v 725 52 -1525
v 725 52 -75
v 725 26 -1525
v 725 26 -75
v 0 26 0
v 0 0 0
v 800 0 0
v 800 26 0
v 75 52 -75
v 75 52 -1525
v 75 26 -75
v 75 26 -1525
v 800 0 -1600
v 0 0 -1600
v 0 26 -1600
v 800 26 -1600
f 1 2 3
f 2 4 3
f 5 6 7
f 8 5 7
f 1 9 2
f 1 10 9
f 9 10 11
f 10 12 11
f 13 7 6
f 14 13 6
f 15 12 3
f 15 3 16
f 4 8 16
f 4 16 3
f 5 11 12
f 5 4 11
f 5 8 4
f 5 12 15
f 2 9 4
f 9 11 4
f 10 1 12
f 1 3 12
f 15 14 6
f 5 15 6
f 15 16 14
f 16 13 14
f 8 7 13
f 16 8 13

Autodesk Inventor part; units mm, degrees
ref_plane "YZ Plane" through (0, 0, 0) normal (1, 0, 0) x (0, 1, 0)
ref_plane "XZ Plane" through (0, 0, 0) normal (0, 1, 0) x (-1, 0, 0)
ref_plane "XY Plane" through (0, 0, 0) normal (0, 0, 1) x (1, 0, 0)
sketch "Sketch1" plane through (0, 0, 0) normal (0, 1, 0) x (-1, 0, 0)
  line L0 (0, 0) -> (-800, 0)
  line L1 (-800, 0) -> (-800, -1600)
  line L2 (-800, -1600) -> (0, -1600)
  line L3 (0, -1600) -> (0, 0)
  dimension "d0" = 800
  dimension "d1" = 1600
extrude "Extrusion1" add sketch "Sketch1" along normal blind 26
sketch "Sketch2" plane through (0, 26, 0) normal (0, 1, 0) x (1, 0, 0)
  line L0 (75, 75) -> (725, 75)
  line L1 (725, 75) -> (725, 1525)
  line L2 (725, 1525) -> (75, 1525)
  line L3 (75, 1525) -> (75, 75)
  line L4 (0, 1600) -> (0, 0) projected
  line L5 (800, 0) -> (800, 1600) projected
  line L6 (0, 0) -> (800, 0) projected
  line L7 (800, 1600) -> (0, 1600) projected
  dimension "d4" = 75
  dimension "d5" = 75
  dimension "d6" = 75
  dimension "d7" = 75
extrude "Extrusion2" add sketch "Sketch2" along normal blind 26 contours L3 L2 L1 L0
sketch "Sketch3" plane through (0, 52, 0) normal (0, 1, 0) x (1, 0, 0)
  point P0 (0, 0)
sketch "Sketch4" plane through (0, 52, 0) normal (0, 1, 0) x (1, 0, 0)
  point P0 (0, 0)
properties part number "tabletop" material "Walnut"
